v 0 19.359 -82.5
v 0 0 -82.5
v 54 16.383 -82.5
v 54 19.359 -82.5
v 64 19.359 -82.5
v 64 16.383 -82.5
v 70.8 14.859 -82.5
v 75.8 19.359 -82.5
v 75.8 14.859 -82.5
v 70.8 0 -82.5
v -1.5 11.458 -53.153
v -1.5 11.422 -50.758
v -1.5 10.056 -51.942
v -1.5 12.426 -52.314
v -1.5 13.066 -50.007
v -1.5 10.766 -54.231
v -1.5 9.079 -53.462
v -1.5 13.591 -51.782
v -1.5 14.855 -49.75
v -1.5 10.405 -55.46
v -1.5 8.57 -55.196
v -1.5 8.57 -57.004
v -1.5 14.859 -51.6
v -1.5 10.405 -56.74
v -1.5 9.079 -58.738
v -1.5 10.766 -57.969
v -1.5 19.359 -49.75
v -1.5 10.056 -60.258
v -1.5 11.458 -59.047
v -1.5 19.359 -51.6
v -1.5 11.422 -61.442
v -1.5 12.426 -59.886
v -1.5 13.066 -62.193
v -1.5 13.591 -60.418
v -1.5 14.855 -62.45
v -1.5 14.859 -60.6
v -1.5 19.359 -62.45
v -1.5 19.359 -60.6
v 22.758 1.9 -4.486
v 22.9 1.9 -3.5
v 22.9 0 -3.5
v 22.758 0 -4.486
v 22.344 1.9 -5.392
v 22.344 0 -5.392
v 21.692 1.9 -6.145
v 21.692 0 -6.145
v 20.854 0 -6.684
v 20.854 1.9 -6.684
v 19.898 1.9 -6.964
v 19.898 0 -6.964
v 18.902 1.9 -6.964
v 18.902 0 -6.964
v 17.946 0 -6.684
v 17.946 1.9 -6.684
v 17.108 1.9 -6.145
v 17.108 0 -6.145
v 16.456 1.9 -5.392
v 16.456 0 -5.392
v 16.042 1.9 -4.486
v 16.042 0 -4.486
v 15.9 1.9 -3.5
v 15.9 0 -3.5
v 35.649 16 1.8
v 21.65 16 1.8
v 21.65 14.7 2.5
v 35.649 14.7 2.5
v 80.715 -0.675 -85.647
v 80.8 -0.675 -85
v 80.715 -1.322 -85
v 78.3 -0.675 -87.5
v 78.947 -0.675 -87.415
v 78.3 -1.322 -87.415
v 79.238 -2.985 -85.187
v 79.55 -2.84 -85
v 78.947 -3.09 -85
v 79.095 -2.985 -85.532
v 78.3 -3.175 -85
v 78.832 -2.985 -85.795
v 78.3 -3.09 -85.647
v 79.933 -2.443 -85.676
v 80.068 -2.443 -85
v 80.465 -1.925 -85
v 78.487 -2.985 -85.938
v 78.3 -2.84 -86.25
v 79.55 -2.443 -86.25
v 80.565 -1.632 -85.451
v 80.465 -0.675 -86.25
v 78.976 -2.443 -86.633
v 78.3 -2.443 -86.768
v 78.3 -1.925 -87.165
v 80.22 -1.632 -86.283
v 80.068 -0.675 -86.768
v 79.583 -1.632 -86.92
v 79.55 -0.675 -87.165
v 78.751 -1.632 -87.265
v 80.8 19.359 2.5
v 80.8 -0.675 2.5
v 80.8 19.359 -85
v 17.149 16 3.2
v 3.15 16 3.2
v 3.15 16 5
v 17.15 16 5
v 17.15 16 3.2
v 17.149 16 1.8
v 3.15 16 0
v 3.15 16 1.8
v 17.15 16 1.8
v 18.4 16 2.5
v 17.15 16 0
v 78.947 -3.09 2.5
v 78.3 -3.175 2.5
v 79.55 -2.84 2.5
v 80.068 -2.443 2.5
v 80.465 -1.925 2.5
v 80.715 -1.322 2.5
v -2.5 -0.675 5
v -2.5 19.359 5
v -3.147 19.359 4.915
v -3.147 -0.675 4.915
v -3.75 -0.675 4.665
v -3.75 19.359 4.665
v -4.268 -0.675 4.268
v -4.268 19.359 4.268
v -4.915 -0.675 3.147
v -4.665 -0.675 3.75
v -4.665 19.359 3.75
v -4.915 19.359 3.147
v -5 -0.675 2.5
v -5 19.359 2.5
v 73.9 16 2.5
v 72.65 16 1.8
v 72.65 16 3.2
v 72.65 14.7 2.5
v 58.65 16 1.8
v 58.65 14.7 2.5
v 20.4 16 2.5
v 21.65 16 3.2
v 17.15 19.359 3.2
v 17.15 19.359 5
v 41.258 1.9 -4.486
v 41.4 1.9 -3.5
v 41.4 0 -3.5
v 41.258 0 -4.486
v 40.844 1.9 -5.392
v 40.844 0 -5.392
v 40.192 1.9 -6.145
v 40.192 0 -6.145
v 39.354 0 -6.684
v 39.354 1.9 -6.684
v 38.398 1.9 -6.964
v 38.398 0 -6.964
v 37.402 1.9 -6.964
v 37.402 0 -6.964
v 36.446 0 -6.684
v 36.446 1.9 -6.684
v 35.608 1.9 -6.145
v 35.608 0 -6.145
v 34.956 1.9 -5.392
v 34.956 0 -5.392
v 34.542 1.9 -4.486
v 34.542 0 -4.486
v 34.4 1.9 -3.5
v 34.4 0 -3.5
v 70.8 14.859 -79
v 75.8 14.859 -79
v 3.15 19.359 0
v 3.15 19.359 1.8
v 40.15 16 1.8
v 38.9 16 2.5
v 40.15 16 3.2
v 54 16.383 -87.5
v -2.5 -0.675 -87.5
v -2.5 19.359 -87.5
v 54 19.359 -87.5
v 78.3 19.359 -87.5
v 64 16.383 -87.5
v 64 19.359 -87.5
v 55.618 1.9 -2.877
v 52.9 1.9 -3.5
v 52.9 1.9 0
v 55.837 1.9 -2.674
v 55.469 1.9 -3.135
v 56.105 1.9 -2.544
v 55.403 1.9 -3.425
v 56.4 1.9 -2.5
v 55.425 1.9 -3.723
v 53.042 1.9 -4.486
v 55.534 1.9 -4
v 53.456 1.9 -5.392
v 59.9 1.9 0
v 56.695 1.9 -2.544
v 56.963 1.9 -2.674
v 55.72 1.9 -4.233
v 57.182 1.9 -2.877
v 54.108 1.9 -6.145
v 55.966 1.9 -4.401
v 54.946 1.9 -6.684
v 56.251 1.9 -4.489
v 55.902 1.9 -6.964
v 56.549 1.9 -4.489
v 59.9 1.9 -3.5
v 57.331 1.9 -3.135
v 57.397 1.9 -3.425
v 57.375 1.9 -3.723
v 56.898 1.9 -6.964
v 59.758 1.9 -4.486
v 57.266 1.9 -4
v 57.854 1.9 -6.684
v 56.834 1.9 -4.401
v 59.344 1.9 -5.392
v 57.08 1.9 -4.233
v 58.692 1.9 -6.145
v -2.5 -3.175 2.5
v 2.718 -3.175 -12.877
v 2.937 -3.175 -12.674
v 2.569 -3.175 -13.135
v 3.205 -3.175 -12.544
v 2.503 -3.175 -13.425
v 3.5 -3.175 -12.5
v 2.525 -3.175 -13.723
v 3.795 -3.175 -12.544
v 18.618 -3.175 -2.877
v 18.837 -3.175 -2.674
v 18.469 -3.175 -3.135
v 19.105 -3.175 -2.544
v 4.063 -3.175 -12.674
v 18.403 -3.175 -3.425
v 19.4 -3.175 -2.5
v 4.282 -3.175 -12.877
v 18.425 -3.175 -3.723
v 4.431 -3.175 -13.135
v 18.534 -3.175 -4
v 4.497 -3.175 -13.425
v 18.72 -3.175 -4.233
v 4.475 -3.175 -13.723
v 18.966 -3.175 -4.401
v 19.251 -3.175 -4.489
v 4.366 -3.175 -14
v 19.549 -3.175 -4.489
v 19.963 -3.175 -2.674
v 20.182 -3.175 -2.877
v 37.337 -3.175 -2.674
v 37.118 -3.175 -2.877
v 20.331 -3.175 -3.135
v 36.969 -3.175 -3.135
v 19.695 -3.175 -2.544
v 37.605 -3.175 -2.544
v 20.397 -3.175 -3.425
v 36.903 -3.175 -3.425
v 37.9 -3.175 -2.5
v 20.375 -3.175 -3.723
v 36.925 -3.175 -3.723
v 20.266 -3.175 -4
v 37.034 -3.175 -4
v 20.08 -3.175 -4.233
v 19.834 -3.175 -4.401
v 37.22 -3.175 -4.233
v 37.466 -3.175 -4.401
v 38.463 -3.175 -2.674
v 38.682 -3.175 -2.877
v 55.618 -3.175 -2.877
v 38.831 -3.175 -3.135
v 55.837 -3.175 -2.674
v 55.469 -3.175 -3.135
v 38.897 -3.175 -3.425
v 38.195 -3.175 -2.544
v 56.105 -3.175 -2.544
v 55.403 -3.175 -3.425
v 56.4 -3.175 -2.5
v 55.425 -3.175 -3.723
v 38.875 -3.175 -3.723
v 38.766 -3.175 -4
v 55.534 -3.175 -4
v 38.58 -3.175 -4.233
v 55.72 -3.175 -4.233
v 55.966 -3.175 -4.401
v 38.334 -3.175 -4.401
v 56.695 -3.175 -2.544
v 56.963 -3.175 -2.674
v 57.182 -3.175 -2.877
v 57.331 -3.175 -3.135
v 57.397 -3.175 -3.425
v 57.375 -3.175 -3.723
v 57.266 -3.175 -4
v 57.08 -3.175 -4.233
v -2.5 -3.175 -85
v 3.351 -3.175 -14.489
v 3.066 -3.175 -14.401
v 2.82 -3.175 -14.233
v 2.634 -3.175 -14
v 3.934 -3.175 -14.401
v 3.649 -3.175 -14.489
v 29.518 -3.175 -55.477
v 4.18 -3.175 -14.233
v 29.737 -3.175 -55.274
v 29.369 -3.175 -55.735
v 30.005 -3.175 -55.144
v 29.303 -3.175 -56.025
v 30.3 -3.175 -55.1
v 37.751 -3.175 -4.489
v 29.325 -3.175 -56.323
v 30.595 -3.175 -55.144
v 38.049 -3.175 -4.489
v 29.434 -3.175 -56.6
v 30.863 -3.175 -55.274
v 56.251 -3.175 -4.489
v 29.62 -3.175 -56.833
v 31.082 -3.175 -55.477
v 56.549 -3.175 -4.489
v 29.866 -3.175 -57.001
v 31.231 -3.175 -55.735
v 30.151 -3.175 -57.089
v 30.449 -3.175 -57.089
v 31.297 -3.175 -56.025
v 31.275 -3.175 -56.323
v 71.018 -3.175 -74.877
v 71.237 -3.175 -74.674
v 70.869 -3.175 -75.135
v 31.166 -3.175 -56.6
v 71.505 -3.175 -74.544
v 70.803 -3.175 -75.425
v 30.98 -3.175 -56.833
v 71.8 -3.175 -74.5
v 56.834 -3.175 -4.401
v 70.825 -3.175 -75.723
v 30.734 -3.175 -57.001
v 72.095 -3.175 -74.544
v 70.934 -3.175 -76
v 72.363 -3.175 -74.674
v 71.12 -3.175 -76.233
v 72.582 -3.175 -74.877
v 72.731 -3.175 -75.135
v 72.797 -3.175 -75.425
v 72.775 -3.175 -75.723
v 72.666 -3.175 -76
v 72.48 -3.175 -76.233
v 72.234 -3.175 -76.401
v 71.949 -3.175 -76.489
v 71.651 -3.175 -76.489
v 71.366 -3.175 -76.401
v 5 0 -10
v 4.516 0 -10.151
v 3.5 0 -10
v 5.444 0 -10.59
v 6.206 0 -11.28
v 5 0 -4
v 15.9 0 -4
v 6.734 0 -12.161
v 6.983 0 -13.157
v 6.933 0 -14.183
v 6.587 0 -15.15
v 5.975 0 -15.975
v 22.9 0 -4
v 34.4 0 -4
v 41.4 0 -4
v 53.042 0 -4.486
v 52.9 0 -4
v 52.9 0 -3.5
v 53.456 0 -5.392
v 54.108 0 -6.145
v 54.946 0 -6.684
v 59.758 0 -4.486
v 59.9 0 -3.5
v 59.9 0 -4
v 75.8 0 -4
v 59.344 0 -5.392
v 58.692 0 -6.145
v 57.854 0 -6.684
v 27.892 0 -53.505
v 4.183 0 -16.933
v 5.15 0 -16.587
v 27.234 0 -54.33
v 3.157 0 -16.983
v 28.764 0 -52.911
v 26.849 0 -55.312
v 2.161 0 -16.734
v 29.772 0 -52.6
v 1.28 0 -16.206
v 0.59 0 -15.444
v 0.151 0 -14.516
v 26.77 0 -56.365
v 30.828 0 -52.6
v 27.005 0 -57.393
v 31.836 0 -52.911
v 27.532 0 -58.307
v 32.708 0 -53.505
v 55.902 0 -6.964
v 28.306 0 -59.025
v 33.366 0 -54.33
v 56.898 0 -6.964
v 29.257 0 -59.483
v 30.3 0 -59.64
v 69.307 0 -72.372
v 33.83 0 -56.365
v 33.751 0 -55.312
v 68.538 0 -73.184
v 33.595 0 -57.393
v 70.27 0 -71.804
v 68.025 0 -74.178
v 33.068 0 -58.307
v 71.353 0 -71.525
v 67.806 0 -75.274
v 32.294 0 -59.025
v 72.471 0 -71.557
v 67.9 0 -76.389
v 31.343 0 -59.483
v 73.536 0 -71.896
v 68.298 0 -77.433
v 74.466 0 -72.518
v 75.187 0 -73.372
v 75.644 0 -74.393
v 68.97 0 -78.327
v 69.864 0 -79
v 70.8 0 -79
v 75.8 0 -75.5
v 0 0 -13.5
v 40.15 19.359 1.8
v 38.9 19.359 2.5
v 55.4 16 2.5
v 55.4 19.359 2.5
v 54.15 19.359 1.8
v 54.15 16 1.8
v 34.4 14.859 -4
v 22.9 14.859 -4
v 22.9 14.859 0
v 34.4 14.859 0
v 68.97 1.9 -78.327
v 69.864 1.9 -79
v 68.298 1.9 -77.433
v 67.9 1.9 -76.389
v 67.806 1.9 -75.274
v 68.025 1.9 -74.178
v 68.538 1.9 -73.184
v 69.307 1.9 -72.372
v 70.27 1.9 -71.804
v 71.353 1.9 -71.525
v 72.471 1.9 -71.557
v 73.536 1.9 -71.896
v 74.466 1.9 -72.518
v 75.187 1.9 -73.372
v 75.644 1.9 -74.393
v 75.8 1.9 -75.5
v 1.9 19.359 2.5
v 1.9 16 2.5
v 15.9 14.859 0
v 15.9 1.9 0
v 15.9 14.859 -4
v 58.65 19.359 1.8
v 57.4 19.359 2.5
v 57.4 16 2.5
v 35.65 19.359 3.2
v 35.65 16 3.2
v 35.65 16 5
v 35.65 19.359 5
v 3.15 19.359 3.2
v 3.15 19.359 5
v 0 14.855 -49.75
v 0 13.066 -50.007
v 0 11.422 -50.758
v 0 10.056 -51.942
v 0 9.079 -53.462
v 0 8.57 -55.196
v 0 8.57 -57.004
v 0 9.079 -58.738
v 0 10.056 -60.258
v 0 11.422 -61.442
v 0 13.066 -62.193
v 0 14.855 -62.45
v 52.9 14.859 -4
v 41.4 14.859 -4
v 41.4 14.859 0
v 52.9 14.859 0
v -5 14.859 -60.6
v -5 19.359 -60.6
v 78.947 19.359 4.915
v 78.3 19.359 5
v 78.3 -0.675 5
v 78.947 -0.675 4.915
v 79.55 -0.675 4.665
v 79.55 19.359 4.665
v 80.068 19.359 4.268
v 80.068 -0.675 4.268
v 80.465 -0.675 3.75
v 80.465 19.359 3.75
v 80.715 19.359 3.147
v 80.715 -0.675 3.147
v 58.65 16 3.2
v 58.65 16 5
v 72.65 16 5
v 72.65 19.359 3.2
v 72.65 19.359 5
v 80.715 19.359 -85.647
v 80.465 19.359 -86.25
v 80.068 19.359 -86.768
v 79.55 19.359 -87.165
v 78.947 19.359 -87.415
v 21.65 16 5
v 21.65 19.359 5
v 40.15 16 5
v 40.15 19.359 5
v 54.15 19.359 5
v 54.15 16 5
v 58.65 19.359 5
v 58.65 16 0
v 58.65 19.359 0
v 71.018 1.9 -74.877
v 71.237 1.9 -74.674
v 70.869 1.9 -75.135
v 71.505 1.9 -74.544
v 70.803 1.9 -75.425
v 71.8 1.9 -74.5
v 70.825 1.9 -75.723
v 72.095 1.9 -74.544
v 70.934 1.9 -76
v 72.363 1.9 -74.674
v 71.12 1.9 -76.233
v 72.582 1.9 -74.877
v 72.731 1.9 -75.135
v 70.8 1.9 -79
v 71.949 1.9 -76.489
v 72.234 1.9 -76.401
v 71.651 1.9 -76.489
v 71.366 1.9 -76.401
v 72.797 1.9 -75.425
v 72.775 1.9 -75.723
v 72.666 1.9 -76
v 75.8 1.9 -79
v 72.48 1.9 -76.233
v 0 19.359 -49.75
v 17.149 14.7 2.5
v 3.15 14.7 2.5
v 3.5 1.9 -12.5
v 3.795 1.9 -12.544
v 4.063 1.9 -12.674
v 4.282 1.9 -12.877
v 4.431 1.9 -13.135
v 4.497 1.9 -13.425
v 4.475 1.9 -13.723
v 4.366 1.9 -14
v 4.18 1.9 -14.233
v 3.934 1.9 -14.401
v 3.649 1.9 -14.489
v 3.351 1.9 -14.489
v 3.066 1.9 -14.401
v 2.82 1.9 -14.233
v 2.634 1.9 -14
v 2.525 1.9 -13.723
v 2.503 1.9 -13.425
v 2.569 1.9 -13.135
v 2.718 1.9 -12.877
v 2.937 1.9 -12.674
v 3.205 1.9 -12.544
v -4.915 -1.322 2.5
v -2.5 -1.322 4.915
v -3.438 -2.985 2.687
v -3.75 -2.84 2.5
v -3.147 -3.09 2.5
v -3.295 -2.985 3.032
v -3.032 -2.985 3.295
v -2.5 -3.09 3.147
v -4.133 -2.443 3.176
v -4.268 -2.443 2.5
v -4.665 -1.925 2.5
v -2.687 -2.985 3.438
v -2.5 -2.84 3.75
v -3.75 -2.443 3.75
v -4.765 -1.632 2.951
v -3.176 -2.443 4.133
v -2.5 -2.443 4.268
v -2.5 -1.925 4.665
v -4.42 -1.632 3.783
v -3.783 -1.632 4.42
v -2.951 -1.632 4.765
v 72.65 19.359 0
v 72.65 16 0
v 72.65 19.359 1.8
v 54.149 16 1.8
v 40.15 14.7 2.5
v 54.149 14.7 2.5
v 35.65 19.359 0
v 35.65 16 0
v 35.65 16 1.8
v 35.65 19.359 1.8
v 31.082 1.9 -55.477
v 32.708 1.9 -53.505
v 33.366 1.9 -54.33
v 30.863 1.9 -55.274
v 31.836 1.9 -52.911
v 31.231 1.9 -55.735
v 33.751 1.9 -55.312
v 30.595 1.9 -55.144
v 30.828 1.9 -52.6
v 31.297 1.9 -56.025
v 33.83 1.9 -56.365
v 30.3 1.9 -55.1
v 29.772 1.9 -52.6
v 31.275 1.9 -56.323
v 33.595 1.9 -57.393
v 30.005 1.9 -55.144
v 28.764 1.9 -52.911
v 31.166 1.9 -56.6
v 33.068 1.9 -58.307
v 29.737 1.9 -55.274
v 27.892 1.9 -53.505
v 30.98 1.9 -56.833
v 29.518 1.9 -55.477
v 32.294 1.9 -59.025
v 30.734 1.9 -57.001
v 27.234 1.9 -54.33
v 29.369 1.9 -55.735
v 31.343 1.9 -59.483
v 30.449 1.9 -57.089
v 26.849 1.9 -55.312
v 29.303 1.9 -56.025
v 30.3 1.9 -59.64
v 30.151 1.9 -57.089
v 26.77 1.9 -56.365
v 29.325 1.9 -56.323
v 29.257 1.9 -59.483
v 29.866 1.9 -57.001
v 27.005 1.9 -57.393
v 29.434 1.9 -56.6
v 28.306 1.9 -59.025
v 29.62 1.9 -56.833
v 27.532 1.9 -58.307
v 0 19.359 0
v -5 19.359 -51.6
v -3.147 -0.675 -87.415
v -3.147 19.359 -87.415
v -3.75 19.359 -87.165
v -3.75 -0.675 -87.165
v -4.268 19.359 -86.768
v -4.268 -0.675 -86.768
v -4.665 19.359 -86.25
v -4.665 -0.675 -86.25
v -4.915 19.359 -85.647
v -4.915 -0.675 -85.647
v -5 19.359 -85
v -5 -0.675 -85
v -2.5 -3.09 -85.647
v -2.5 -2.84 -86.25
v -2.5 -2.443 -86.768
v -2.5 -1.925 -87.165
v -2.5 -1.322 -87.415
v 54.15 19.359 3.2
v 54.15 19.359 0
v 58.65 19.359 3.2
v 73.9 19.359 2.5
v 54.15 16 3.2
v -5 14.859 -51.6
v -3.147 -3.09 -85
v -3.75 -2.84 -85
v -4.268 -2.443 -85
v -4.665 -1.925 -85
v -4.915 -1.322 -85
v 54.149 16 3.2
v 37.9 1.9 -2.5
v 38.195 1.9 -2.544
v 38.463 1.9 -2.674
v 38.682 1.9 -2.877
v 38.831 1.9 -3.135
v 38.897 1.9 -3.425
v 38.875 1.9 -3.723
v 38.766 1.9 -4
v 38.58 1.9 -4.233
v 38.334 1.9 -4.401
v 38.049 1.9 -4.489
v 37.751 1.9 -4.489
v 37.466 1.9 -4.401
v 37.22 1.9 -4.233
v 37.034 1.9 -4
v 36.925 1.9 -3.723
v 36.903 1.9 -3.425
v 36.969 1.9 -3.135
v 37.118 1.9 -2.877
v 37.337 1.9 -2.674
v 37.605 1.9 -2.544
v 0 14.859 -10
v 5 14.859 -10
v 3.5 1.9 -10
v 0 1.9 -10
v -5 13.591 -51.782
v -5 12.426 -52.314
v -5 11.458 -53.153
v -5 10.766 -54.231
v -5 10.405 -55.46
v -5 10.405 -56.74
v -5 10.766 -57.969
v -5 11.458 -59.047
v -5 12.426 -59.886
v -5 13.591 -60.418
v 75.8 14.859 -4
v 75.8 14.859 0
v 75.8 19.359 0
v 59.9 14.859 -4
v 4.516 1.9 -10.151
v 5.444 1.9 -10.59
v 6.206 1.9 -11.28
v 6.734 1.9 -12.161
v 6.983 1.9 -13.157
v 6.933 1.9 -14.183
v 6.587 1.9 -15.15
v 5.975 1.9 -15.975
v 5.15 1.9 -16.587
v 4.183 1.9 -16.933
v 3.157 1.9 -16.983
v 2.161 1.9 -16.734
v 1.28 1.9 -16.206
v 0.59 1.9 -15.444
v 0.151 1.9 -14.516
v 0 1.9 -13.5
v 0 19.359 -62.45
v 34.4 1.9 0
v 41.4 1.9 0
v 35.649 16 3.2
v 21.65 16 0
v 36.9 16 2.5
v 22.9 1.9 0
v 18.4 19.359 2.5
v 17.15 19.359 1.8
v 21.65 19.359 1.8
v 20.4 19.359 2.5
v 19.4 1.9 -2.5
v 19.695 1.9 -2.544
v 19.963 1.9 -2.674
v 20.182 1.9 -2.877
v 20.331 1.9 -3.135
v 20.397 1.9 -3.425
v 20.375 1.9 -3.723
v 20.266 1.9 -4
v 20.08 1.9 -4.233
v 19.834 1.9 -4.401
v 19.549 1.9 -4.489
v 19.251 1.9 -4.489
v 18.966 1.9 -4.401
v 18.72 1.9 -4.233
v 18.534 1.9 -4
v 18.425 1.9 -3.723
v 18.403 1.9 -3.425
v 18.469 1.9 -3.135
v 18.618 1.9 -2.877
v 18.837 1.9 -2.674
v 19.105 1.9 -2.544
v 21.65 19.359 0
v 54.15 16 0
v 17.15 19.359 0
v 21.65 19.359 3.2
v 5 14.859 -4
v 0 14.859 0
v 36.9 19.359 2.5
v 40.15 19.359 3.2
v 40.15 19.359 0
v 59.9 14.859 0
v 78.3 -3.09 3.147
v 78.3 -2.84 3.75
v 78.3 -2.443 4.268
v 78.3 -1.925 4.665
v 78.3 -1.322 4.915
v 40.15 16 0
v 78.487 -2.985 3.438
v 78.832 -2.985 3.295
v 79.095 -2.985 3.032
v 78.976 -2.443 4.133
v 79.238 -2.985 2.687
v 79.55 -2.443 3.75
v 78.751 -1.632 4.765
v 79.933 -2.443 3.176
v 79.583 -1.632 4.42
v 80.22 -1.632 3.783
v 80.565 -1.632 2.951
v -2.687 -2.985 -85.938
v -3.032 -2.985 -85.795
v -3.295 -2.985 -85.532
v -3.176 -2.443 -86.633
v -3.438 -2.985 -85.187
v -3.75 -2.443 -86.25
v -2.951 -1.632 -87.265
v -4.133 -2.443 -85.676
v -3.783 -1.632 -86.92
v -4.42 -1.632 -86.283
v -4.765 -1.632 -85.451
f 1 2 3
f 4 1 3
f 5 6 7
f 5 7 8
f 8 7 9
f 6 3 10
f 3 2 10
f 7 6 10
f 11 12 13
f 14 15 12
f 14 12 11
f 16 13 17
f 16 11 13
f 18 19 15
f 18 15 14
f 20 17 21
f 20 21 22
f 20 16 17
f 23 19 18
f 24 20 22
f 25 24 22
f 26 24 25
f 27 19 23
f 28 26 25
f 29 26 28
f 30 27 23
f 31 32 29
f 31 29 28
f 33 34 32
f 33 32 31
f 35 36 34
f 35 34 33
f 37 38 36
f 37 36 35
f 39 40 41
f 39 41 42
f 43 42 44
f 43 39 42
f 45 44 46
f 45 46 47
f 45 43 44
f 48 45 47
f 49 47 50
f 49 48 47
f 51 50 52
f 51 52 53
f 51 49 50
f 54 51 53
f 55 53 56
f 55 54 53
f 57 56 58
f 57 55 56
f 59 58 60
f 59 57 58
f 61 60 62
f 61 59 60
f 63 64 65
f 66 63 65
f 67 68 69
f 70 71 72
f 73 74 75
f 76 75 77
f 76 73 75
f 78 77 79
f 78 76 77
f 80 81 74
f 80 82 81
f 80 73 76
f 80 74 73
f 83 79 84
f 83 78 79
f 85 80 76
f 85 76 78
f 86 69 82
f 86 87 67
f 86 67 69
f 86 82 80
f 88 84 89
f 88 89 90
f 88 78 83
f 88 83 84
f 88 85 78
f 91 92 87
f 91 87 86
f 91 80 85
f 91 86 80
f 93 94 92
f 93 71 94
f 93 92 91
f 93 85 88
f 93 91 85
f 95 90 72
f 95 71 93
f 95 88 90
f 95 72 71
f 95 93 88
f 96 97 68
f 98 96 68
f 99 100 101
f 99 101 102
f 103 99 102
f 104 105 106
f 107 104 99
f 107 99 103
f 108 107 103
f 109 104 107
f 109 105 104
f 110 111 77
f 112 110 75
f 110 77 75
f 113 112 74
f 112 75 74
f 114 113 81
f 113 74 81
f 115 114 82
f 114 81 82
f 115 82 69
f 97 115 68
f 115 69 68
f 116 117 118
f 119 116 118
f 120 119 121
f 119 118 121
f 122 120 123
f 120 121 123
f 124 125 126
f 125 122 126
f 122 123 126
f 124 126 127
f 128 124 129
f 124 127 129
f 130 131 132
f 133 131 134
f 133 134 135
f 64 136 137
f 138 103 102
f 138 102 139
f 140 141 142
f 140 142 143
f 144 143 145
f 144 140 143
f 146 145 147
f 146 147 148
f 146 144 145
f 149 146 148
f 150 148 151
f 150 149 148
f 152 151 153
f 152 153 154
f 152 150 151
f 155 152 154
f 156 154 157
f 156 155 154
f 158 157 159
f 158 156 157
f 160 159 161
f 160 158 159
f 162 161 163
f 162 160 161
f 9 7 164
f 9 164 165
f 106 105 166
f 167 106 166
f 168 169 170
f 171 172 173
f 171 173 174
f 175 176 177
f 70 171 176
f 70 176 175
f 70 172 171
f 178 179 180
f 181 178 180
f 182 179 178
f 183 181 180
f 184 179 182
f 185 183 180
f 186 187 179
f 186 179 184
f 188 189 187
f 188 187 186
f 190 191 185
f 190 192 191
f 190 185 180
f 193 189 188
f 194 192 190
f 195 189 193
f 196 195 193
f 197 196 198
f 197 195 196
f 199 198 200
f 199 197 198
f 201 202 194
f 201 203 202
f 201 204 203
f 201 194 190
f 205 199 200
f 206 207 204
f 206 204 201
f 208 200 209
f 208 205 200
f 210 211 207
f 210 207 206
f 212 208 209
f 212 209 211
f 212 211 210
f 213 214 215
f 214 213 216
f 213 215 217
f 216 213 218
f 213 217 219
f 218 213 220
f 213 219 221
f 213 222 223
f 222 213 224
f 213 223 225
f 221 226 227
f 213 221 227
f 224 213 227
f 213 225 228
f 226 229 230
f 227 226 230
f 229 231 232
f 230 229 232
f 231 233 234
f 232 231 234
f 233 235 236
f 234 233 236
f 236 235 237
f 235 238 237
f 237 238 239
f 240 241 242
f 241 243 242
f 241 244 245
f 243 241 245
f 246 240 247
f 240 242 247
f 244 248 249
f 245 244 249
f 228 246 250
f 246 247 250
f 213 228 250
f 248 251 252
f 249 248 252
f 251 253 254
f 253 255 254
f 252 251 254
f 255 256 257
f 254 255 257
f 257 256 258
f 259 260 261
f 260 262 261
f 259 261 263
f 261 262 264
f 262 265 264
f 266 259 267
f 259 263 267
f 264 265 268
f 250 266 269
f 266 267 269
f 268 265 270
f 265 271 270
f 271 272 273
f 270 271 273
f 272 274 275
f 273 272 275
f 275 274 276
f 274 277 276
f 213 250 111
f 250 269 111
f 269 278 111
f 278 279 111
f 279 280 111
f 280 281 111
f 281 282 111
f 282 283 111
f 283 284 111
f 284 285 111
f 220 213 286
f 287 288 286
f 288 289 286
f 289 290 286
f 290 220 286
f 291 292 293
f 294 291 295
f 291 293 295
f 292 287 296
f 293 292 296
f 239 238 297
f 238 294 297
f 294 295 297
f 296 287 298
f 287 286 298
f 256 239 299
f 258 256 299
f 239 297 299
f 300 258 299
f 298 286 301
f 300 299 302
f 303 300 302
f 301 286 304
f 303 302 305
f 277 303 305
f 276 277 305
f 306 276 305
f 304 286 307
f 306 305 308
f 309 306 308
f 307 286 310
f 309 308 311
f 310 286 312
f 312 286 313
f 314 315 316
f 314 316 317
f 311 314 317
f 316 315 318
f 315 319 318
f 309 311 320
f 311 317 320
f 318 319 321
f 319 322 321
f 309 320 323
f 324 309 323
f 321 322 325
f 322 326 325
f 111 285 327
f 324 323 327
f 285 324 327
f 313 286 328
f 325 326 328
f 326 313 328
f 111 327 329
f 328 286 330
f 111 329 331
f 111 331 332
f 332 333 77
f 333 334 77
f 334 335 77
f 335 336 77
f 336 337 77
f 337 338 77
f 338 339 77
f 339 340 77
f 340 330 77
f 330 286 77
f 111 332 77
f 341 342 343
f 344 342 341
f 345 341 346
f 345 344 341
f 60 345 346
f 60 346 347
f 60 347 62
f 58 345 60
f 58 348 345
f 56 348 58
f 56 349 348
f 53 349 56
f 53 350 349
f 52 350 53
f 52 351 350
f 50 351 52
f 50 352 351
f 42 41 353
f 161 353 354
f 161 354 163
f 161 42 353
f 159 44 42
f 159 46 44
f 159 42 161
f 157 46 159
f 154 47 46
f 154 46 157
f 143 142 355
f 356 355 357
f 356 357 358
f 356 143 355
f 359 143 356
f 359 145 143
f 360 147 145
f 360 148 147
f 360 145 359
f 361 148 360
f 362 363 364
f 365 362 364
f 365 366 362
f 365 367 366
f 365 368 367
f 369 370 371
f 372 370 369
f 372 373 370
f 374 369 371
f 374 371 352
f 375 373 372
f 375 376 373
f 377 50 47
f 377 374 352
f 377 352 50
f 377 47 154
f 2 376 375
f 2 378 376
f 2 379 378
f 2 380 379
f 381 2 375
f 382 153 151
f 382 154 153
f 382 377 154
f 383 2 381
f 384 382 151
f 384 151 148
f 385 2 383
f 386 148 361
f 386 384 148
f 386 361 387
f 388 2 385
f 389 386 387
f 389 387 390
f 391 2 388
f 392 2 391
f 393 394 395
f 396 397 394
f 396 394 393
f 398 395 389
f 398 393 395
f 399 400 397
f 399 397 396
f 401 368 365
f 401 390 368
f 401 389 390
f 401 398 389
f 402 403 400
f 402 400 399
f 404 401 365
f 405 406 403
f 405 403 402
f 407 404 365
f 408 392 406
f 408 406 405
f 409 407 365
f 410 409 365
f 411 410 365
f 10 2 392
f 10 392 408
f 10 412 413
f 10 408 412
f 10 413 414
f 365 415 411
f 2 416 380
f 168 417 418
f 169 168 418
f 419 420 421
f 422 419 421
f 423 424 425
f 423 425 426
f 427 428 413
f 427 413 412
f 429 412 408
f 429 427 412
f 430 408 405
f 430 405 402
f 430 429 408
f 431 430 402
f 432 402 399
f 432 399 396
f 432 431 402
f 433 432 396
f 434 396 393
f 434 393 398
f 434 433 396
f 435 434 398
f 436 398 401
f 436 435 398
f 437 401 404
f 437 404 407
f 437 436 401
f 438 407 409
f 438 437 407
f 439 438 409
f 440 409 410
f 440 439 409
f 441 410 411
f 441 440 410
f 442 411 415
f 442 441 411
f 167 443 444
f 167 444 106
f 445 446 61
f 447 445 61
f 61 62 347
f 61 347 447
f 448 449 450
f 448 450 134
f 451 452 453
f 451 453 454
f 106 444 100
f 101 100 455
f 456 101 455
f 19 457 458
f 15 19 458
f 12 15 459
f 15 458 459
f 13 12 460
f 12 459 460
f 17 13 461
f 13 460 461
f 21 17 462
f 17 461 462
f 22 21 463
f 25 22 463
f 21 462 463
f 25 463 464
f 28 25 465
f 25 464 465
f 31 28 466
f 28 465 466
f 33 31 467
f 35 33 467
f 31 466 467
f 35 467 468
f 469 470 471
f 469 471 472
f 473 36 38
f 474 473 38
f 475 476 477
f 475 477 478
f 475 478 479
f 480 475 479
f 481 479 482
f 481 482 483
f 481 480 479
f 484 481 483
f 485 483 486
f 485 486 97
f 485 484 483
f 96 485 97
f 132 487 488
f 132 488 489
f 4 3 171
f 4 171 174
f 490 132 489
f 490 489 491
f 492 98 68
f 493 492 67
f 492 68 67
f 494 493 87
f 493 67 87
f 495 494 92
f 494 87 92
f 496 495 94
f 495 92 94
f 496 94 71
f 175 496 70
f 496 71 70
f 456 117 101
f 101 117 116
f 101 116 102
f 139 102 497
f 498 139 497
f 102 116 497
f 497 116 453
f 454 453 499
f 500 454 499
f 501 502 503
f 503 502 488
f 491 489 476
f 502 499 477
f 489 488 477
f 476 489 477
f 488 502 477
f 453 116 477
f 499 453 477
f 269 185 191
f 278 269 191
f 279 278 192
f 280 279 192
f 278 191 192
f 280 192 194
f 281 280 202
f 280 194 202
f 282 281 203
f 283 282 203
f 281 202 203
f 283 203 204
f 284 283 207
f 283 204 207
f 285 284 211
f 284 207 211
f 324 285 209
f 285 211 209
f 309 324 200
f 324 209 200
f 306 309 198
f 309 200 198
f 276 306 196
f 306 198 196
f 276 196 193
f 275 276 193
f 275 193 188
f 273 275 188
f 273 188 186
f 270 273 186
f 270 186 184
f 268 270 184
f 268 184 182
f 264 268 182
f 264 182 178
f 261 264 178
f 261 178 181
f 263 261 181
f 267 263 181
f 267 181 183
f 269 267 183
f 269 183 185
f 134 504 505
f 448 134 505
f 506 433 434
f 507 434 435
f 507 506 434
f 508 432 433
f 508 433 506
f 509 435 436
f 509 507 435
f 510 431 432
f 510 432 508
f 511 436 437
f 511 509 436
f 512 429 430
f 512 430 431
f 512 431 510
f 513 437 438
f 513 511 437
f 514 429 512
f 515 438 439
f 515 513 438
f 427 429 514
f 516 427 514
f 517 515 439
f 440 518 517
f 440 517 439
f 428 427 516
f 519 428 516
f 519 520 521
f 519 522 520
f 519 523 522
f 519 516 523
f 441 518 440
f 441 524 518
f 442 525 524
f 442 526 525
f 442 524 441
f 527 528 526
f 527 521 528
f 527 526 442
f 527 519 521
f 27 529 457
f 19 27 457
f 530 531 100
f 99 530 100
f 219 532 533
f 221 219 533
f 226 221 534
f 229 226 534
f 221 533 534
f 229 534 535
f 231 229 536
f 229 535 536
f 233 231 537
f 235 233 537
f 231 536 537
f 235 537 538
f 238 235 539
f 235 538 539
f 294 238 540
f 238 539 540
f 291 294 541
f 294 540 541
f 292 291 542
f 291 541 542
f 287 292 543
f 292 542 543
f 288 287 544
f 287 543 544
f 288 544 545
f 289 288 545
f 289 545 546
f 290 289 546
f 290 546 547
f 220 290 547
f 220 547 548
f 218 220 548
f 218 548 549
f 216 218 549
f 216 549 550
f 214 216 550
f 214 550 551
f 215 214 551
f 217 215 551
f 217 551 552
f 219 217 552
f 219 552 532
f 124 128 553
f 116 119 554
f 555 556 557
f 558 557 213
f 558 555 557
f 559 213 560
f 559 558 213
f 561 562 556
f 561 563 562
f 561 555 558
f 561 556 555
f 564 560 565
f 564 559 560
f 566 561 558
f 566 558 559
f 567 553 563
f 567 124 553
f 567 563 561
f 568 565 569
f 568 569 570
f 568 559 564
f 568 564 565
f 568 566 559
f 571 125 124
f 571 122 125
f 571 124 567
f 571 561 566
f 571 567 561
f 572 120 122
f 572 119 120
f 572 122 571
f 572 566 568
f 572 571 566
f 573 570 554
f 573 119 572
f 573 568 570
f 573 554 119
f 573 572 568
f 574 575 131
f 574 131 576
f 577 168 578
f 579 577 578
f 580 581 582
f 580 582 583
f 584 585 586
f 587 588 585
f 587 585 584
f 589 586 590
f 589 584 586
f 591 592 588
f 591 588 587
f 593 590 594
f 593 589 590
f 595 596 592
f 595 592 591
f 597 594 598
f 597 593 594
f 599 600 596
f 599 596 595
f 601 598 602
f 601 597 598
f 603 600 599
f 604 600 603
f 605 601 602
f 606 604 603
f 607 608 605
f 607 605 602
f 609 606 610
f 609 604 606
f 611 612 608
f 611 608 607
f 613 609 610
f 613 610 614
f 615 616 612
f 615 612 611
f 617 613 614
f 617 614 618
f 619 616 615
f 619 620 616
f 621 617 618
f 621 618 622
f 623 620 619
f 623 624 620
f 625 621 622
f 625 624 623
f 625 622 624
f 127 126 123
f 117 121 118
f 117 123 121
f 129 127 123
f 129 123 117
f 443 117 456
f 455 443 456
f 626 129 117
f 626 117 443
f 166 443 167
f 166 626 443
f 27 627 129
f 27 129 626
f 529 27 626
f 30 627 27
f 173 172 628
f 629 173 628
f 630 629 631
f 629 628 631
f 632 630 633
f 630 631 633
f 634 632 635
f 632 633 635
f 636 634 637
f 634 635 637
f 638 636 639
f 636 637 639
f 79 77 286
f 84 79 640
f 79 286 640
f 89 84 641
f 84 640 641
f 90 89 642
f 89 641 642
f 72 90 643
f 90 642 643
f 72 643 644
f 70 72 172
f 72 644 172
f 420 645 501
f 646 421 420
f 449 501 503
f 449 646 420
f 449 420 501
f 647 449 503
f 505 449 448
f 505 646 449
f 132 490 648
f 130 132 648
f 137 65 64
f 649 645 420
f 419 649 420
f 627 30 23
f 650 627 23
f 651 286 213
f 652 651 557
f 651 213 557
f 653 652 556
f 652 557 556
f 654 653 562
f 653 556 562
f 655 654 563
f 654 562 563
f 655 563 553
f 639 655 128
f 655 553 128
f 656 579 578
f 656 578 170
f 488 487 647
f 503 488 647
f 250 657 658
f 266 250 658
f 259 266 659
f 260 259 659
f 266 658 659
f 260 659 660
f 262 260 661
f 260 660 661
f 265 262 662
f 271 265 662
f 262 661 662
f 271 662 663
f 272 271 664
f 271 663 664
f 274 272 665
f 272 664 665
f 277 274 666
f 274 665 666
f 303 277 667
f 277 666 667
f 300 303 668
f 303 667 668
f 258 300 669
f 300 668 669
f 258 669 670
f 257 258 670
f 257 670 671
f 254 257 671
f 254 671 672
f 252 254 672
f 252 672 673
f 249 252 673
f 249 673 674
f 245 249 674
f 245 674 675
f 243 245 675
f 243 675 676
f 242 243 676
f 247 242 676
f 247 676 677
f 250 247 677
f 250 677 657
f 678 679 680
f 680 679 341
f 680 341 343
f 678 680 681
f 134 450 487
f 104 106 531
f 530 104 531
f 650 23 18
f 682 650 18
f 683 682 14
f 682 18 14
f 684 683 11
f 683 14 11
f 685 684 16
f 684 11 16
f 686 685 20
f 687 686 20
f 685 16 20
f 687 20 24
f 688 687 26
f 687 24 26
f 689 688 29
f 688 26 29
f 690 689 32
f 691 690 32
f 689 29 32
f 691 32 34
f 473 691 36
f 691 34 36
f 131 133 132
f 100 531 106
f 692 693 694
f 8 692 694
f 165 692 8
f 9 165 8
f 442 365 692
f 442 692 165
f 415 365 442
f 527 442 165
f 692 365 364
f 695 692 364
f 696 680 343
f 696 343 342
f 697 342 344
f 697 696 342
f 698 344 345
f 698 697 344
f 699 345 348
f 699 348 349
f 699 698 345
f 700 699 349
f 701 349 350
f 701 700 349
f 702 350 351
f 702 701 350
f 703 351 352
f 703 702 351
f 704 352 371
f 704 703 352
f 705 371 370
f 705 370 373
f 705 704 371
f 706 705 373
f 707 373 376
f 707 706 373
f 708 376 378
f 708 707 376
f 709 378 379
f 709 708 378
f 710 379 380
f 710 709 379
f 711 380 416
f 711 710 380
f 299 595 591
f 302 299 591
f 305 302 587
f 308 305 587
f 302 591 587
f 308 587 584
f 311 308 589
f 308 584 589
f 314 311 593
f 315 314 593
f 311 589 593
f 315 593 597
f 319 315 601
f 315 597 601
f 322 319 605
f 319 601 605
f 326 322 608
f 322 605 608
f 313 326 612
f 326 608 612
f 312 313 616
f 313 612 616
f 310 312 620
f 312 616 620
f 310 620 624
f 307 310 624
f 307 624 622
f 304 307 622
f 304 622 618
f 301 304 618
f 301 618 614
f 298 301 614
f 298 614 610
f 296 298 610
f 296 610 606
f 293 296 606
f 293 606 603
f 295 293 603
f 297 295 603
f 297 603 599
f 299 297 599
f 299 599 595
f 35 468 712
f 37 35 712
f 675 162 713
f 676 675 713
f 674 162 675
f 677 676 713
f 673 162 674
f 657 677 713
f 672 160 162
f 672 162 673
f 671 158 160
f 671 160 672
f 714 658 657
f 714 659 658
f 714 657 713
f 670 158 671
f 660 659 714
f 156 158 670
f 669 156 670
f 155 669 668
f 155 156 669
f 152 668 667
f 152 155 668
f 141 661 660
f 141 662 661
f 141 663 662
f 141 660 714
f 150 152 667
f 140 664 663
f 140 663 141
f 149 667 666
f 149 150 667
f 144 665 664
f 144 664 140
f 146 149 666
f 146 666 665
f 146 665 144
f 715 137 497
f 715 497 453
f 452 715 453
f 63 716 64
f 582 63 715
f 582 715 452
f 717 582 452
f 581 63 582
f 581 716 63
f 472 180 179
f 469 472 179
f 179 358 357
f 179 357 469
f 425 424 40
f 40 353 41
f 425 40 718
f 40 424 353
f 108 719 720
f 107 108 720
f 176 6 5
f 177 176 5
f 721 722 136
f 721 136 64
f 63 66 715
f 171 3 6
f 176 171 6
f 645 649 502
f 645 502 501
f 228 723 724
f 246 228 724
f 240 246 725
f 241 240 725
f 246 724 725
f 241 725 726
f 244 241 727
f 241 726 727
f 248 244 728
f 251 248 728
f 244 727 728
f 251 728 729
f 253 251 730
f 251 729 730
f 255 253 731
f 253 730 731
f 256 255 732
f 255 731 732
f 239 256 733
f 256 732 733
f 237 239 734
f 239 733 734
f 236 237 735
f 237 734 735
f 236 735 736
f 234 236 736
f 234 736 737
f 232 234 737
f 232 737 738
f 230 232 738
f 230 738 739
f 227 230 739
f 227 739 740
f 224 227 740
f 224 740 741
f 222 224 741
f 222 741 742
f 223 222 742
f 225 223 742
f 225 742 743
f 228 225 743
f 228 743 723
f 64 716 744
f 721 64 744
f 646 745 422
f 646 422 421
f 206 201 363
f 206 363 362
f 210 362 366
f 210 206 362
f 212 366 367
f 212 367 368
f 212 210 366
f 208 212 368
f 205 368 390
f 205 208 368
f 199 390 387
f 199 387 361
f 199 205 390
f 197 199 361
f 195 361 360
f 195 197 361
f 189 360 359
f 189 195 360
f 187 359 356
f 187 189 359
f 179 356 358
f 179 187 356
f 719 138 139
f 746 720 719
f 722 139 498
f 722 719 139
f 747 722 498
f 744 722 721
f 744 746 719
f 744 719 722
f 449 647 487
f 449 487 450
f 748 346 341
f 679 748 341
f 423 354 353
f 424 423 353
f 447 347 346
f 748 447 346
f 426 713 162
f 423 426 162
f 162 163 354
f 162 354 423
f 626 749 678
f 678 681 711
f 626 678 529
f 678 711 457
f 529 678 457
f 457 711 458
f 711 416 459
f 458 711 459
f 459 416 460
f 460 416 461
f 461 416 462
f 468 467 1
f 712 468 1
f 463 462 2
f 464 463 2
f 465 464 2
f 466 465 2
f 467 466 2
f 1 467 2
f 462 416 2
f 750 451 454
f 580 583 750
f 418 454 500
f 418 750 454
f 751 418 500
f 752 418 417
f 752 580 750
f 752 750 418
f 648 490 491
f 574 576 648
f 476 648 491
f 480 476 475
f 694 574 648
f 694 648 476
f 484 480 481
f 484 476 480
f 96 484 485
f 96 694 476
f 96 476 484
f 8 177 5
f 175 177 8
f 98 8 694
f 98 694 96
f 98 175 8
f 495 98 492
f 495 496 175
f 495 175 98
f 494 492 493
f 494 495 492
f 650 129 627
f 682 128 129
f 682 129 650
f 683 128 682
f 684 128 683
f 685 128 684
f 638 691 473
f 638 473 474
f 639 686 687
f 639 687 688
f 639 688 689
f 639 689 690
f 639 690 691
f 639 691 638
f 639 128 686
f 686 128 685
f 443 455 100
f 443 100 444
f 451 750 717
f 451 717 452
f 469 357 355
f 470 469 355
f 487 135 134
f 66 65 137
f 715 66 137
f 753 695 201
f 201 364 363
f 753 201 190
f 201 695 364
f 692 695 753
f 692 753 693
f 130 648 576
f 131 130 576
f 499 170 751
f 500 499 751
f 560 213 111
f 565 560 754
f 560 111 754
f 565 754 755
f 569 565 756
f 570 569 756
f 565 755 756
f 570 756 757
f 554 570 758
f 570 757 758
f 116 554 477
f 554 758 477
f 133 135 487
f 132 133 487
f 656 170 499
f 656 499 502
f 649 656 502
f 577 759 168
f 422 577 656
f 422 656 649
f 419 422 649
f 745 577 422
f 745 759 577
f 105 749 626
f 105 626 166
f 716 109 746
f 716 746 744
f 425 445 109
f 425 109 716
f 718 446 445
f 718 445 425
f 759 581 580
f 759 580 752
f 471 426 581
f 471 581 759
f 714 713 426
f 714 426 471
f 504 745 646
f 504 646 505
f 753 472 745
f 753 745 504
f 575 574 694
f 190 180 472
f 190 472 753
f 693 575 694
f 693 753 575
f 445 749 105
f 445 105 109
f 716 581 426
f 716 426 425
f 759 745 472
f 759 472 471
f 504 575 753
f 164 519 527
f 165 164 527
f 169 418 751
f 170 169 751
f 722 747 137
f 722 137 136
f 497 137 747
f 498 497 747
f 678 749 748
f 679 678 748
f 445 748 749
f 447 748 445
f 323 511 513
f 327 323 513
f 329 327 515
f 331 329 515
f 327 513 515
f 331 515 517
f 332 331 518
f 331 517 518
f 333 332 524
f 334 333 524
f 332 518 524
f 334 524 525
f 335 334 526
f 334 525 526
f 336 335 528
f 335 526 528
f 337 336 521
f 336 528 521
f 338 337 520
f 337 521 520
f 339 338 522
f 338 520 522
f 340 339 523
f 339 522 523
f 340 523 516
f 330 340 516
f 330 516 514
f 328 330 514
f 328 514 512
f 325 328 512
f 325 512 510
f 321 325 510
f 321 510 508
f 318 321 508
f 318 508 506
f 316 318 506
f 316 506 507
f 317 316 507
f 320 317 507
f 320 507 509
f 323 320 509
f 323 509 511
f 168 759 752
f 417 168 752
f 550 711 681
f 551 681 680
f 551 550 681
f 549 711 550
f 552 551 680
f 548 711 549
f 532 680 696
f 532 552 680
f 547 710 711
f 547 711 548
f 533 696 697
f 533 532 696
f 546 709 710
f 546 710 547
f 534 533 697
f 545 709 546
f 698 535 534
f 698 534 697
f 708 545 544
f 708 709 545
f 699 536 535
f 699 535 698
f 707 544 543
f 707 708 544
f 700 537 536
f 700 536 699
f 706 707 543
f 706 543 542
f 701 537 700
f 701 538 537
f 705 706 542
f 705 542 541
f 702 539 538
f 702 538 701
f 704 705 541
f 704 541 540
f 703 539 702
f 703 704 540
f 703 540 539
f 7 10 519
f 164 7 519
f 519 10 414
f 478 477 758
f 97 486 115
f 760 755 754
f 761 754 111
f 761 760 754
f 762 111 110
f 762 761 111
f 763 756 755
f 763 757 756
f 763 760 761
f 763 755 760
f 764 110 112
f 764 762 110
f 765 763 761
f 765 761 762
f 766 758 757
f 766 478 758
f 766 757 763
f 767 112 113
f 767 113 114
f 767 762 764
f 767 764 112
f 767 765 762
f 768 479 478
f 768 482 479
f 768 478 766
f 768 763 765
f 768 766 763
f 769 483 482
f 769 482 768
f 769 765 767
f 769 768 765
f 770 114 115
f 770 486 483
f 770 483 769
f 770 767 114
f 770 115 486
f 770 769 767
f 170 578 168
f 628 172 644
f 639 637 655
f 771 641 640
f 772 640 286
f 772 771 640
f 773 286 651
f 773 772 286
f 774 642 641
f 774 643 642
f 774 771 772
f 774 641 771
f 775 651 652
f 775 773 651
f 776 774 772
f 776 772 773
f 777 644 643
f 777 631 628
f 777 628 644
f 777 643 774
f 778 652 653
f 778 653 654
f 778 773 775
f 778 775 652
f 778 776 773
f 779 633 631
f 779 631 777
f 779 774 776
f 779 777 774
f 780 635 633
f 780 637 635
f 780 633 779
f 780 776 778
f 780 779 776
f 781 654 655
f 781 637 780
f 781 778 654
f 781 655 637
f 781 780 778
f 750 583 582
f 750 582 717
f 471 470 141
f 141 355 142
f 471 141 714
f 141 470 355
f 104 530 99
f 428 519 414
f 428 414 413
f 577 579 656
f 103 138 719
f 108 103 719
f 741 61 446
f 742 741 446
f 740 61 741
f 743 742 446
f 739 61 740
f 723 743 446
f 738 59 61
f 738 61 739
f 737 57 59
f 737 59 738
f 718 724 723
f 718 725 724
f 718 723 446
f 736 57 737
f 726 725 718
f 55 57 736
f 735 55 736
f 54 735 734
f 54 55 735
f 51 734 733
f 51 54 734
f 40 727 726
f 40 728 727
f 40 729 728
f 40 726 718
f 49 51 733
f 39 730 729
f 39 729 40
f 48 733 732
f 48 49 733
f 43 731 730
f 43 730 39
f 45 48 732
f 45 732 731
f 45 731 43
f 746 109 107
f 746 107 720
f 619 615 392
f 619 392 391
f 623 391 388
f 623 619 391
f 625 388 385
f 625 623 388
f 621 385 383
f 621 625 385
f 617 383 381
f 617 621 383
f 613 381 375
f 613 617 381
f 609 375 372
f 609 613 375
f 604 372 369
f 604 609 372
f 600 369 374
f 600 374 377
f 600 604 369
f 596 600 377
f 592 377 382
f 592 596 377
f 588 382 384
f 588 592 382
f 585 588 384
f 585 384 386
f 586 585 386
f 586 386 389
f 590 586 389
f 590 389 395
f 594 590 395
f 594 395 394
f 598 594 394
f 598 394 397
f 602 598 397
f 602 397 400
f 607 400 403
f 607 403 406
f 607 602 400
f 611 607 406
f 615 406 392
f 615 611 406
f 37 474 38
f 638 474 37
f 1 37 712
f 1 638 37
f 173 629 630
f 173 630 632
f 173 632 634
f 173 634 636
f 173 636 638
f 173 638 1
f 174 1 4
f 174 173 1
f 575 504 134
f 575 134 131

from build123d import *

# Parameters (mm, degrees)
SKETCH1_W           = 85.8
SKETCH1_H           = 92.5
BOSS_EXTRUDE1_DEPTH = 14.859
SKETCH2_W           = 85.8
SKETCH2_H           = 92.5
SKETCH2_R           = 1
BOSS_EXTRUDE2_DEPTH = 3.175
SKETCH4_W           = 85.8
SKETCH4_H           = 92.5
SKETCH4_W_2         = 75.8
SKETCH4_H_2         = 82.5
BOSS_EXTRUDE3_DEPTH = 4.5
CUT_EXTRUDE1_DEPTH  = 121.663419813
SKETCH5_W           = 14
SKETCH5_H           = 8
CUT_EXTRUDE2_DEPTH  = 121.663419813
SKETCH6_W           = 10
SKETCH6_H           = 6
CUT_EXTRUDE3_DEPTH  = 121.663419813
BOSS_EXTRUDE4_START = 1.9
SKETCH7_R           = 3.54
SKETCH7_R_2         = 1
BOSS_EXTRUDE4_DEPTH = 1.9
FILLET1_R           = 2.5
FILLET2_R           = 2.5
FILLET3_R           = 2.5
FILLET4_R           = 2.5
FILLET5_R           = 2.5
CUT_EXTRUDE4_DEPTH  = 1.5
CUT_EXTRUDE5_DEPTH  = 4
CUT_EXTRUDE7_DEPTH  = 73.9
SKETCH12_W          = 4.501
SKETCH12_H          = 4
BOSS_EXTRUDE8_DEPTH = 5


with BuildPart() as part:
    # Sketch1 → Boss-Extrude1 (new body)
    with BuildSketch(Plane(origin=(0, 0, 0), x_dir=(1, 0, 0), z_dir=(0, 1, 0))):
        with Locations((37.9, 41.25)):
            Rectangle(SKETCH1_W, SKETCH1_H)
        Polygon((5, 4), (5, 10), (0, 10), (0, 82.5), (70.8, 82.5), (70.8, 79), (75.8, 79), (75.8, 4), (59.9, 4), (59.9, 0), (52.9, 0), (52.9, 4), (41.4, 4), (41.4, 0), (34.4, 0), (34.4, 4), (22.9, 4), (22.9, 0), (15.9, 0), (15.9, 4), align=None, mode=Mode.SUBTRACT)
    extrude(amount=BOSS_EXTRUDE1_DEPTH)

    # Sketch2 → Boss-Extrude2 (add)
    with BuildSketch(Plane(origin=(0, 0, 0), x_dir=(1, 0, 0), z_dir=(0, 1, 0))):
        with Locations((37.9, 41.25)):
            Rectangle(SKETCH2_W, SKETCH2_H)
        with Locations(Location((3.5, 13.5, 0), (0, 0, 270))):
            Circle(SKETCH2_R, mode=Mode.SUBTRACT)
        with Locations(Location((19.4, 3.5, 0), (0, 0, 270))):
            Circle(SKETCH2_R, mode=Mode.SUBTRACT)
        with Locations(Location((37.9, 3.5, 0), (0, 0, 270))):
            Circle(SKETCH2_R, mode=Mode.SUBTRACT)
        with Locations(Location((56.4, 3.5, 0), (0, 0, 270))):
            Circle(SKETCH2_R, mode=Mode.SUBTRACT)
        with Locations(Location((30.3, 56.1, 0), (0, 0, 270))):
            Circle(SKETCH2_R, mode=Mode.SUBTRACT)
        with Locations(Location((71.8, 75.5, 0), (0, 0, 270))):
            Circle(SKETCH2_R, mode=Mode.SUBTRACT)
    extrude(amount=-BOSS_EXTRUDE2_DEPTH)

    # Sketch4 → Boss-Extrude3 (add)
    with BuildSketch(Plane(origin=(0, 14.859, 0), x_dir=(1, 0, 0), z_dir=(0, 1, 0))):
        with Locations((37.9, 41.25)):
            Rectangle(SKETCH4_W, SKETCH4_H)
        with Locations((37.9, 41.25)):
            Rectangle(SKETCH4_W_2, SKETCH4_H_2, mode=Mode.SUBTRACT)
    extrude(amount=BOSS_EXTRUDE3_DEPTH)

    # Sketch3 → Cut-Extrude1 (cut, through all)
    with BuildSketch(Plane(origin=(0, 0, 0), x_dir=(0, 0, -1), z_dir=(1, 0, 0))):
        with BuildLine():
            Line((60.6, 14.859), (60.6, 19.359))
            Line((60.6, 19.359), (51.6, 19.359))
            Line((51.6, 19.359), (51.6, 14.859))
            ThreePointArc((51.6, 14.859), (56.1, 10.359), (60.6, 14.859))
        make_face()
    extrude(amount=-CUT_EXTRUDE1_DEPTH, mode=Mode.SUBTRACT)

    # Sketch5 → Cut-Extrude2 (cut, through all)
    with BuildSketch(Plane.XY):
        with Locations((10.15, 20)):
            Rectangle(SKETCH5_W, SKETCH5_H)
        with Locations((28.65, 20)):
            Rectangle(SKETCH5_W, SKETCH5_H)
        with Locations((47.15, 20)):
            Rectangle(SKETCH5_W, SKETCH5_H)
        with Locations((65.65, 20)):
            Rectangle(SKETCH5_W, SKETCH5_H)
    extrude(amount=CUT_EXTRUDE2_DEPTH, mode=Mode.SUBTRACT)

    # Sketch6 → Cut-Extrude3 (cut, through all)
    with BuildSketch(Plane.XY):
        with Locations((59, 19.383)):
            Rectangle(SKETCH6_W, SKETCH6_H)
    extrude(amount=-CUT_EXTRUDE3_DEPTH, mode=Mode.SUBTRACT)

    # Sketch7 → Boss-Extrude4 (add)
    # profile 1 of 6: a face of its own
    with BuildSketch(Plane(origin=(0, 0, 0), x_dir=(1, 0, 0), z_dir=(0, 1, 0)).offset(BOSS_EXTRUDE4_START)):
        with Locations(Location((30.3, 56.1, 0), (0, 0, 90))):
            Circle(SKETCH7_R)
        with Locations(Location((30.3, 56.1, 0), (0, 0, 270))):
            Circle(SKETCH7_R_2, mode=Mode.SUBTRACT)
    # profile 2 of 6: a face of its own
    with BuildSketch(Plane(origin=(0, 0, 0), x_dir=(1, 0, 0), z_dir=(0, 1, 0)).offset(BOSS_EXTRUDE4_START)):
        with BuildLine():
            Line((0, 13.5), (0, 10))
            Line((0, 10), (3.5, 10))
            ThreePointArc((3.5, 10), (5.974873734, 15.974873734), (0, 13.5))
        make_face()
        with Locations(Location((3.5, 13.5, 0), (0, 0, 270))):
            Circle(SKETCH7_R_2, mode=Mode.SUBTRACT)
    # profile 3 of 6: a face of its own
    with BuildSketch(Plane(origin=(0, 0, 0), x_dir=(1, 0, 0), z_dir=(0, 1, 0)).offset(BOSS_EXTRUDE4_START)):
        with BuildLine():
            Line((15.9, 3.5), (15.9, 0))
            Line((15.9, 0), (22.9, 0))
            Line((22.9, 0), (22.9, 3.5))
            ThreePointArc((22.9, 3.5), (19.4, 7), (15.9, 3.5))
        make_face()
        with Locations(Location((19.4, 3.5, 0), (0, 0, 270))):
            Circle(SKETCH7_R_2, mode=Mode.SUBTRACT)
    # profile 4 of 6: a face of its own
    with BuildSketch(Plane(origin=(0, 0, 0), x_dir=(1, 0, 0), z_dir=(0, 1, 0)).offset(BOSS_EXTRUDE4_START)):
        with BuildLine():
            Line((34.4, 3.5), (34.4, 0))
            Line((34.4, 0), (41.4, 0))
            Line((41.4, 0), (41.4, 3.5))
            ThreePointArc((41.4, 3.5), (37.9, 7), (34.4, 3.5))
        make_face()
        with Locations(Location((37.9, 3.5, 0), (0, 0, 270))):
            Circle(SKETCH7_R_2, mode=Mode.SUBTRACT)
    # profile 5 of 6: a face of its own
    with BuildSketch(Plane(origin=(0, 0, 0), x_dir=(1, 0, 0), z_dir=(0, 1, 0)).offset(BOSS_EXTRUDE4_START)):
        with BuildLine():
            Line((52.9, 3.5), (52.9, 0))
            Line((52.9, 0), (59.9, 0))
            Line((59.9, 0), (59.9, 3.5))
            ThreePointArc((59.9, 3.5), (56.4, 7), (52.9, 3.5))
        make_face()
        with Locations(Location((56.4, 3.5, 0), (0, 0, 270))):
            Circle(SKETCH7_R_2, mode=Mode.SUBTRACT)
    # profile 6 of 6: a face of its own
    with BuildSketch(Plane(origin=(0, 0, 0), x_dir=(1, 0, 0), z_dir=(0, 1, 0)).offset(BOSS_EXTRUDE4_START)):
        with BuildLine():
            Line((75.8, 79), (69.863508327, 79))
            ThreePointArc((69.863508327, 79), (69.768493994, 72.054280431), (75.8, 75.5))
            Line((75.8, 75.5), (75.8, 79))
        make_face()
        with Locations(Location((71.8, 75.5, 0), (0, 0, 270))):
            Circle(SKETCH7_R_2, mode=Mode.SUBTRACT)
    extrude(amount=-BOSS_EXTRUDE4_DEPTH)

    # Fillet1
    fillet1_edges = [part.edges().sort_by_distance(p)[0] for p in [
        (-5, 8.092, 5),
    ]]
    fillet(fillet1_edges, radius=FILLET1_R)

    # Fillet2
    fillet2_edges = [part.edges().sort_by_distance(p)[0] for p in [
        (80.8, 8.092, 5),
    ]]
    fillet(fillet2_edges, radius=FILLET2_R)

    # Fillet3
    fillet3_edges = [part.edges().sort_by_distance(p)[0] for p in [
        (80.8, 8.092, -87.5),
    ]]
    fillet(fillet3_edges, radius=FILLET3_R)

    # Fillet4
    fillet4_edges = [part.edges().sort_by_distance(p)[0] for p in [
        (-5, 8.092, -87.5),
    ]]
    fillet(fillet4_edges, radius=FILLET4_R)

    # Fillet5
    fillet5_edges = [part.edges().sort_by_distance(p)[0] for p in [
        (37.9, -3.175, 5),
        (-4.267766953, -3.175, 4.267766953),
        (80.8, -3.175, -41.25),
        (80.067766953, -3.175, 4.267766953),
        (37.9, -3.175, -87.5),
        (80.067766953, -3.175, -86.767766953),
        (-5, -3.175, -41.25),
        (-4.267766953, -3.175, -86.767766953),
    ]]
    fillet(fillet5_edges, radius=FILLET5_R)

    # Sketch8 → Cut-Extrude4 (cut)
    with BuildSketch(Plane(origin=(0, 0, 0), x_dir=(0, 0, -1), z_dir=(1, 0, 0))):
        with BuildLine():
            Line((62.45, 14.855), (62.45, 21.205))
            Line((62.45, 21.205), (49.75, 21.205))
            Line((49.75, 21.205), (49.75, 14.855))
            ThreePointArc((49.75, 14.855), (56.1, 8.505), (62.45, 14.855))
        make_face()
    extrude(amount=-CUT_EXTRUDE4_DEPTH, mode=Mode.SUBTRACT)

    # Sketch9 → Cut-Extrude5 (cut)
    with BuildSketch(Plane(origin=(0, 19.359, 0), x_dir=(1, 0, 0), z_dir=(0, 1, 0))):
        Polygon((3.15, -1.8), (3.15, -3.2), (1.9, -2.5), align=None)
        Polygon((17.15, -1.8), (17.15, -3.2), (18.4, -2.5), align=None)
        Polygon((21.65, -1.8), (21.65, -3.2), (20.4, -2.5), align=None)
        Polygon((35.65, -1.8), (36.9, -2.5), (35.65, -3.2), align=None)
        Polygon((40.15, -1.8), (38.9, -2.5), (40.15, -3.2), align=None)
        Polygon((54.15, -1.8), (54.15, -3.2), (55.4, -2.5), align=None)
        Polygon((58.65, -1.8), (58.65, -3.2), (57.4, -2.5), align=None)
        Polygon((72.65, -1.8), (72.65, -3.2), (73.9, -2.5), align=None)
    extrude(amount=-CUT_EXTRUDE5_DEPTH, mode=Mode.SUBTRACT)

    # Sketch10 → Cut-Extrude7 (cut)
    with BuildSketch(Plane(origin=(0, 0, 0), x_dir=(0, 0, -1), z_dir=(1, 0, 0))):
        Polygon((-3.2, 16), (-1.8, 16), (-2.5, 14.7), align=None)
    extrude(amount=CUT_EXTRUDE7_DEPTH, mode=Mode.SUBTRACT)

    # Sketch12 → Boss-Extrude8 (add)
    with BuildSketch(Plane.XY):
        with Locations((0.8995, 14)):
            Rectangle(SKETCH12_W, SKETCH12_H)
        with Locations((19.3995, 14)):
            Rectangle(SKETCH12_W, SKETCH12_H)
        with Locations((37.8995, 14)):
            Rectangle(SKETCH12_W, SKETCH12_H)
        with Locations((56.3995, 14)):
            Rectangle(SKETCH12_W, SKETCH12_H)
        with Locations((74.9005, 14)):
            Rectangle(SKETCH12_W, SKETCH12_H)
    extrude(amount=BOSS_EXTRUDE8_DEPTH)


solid = part.part
